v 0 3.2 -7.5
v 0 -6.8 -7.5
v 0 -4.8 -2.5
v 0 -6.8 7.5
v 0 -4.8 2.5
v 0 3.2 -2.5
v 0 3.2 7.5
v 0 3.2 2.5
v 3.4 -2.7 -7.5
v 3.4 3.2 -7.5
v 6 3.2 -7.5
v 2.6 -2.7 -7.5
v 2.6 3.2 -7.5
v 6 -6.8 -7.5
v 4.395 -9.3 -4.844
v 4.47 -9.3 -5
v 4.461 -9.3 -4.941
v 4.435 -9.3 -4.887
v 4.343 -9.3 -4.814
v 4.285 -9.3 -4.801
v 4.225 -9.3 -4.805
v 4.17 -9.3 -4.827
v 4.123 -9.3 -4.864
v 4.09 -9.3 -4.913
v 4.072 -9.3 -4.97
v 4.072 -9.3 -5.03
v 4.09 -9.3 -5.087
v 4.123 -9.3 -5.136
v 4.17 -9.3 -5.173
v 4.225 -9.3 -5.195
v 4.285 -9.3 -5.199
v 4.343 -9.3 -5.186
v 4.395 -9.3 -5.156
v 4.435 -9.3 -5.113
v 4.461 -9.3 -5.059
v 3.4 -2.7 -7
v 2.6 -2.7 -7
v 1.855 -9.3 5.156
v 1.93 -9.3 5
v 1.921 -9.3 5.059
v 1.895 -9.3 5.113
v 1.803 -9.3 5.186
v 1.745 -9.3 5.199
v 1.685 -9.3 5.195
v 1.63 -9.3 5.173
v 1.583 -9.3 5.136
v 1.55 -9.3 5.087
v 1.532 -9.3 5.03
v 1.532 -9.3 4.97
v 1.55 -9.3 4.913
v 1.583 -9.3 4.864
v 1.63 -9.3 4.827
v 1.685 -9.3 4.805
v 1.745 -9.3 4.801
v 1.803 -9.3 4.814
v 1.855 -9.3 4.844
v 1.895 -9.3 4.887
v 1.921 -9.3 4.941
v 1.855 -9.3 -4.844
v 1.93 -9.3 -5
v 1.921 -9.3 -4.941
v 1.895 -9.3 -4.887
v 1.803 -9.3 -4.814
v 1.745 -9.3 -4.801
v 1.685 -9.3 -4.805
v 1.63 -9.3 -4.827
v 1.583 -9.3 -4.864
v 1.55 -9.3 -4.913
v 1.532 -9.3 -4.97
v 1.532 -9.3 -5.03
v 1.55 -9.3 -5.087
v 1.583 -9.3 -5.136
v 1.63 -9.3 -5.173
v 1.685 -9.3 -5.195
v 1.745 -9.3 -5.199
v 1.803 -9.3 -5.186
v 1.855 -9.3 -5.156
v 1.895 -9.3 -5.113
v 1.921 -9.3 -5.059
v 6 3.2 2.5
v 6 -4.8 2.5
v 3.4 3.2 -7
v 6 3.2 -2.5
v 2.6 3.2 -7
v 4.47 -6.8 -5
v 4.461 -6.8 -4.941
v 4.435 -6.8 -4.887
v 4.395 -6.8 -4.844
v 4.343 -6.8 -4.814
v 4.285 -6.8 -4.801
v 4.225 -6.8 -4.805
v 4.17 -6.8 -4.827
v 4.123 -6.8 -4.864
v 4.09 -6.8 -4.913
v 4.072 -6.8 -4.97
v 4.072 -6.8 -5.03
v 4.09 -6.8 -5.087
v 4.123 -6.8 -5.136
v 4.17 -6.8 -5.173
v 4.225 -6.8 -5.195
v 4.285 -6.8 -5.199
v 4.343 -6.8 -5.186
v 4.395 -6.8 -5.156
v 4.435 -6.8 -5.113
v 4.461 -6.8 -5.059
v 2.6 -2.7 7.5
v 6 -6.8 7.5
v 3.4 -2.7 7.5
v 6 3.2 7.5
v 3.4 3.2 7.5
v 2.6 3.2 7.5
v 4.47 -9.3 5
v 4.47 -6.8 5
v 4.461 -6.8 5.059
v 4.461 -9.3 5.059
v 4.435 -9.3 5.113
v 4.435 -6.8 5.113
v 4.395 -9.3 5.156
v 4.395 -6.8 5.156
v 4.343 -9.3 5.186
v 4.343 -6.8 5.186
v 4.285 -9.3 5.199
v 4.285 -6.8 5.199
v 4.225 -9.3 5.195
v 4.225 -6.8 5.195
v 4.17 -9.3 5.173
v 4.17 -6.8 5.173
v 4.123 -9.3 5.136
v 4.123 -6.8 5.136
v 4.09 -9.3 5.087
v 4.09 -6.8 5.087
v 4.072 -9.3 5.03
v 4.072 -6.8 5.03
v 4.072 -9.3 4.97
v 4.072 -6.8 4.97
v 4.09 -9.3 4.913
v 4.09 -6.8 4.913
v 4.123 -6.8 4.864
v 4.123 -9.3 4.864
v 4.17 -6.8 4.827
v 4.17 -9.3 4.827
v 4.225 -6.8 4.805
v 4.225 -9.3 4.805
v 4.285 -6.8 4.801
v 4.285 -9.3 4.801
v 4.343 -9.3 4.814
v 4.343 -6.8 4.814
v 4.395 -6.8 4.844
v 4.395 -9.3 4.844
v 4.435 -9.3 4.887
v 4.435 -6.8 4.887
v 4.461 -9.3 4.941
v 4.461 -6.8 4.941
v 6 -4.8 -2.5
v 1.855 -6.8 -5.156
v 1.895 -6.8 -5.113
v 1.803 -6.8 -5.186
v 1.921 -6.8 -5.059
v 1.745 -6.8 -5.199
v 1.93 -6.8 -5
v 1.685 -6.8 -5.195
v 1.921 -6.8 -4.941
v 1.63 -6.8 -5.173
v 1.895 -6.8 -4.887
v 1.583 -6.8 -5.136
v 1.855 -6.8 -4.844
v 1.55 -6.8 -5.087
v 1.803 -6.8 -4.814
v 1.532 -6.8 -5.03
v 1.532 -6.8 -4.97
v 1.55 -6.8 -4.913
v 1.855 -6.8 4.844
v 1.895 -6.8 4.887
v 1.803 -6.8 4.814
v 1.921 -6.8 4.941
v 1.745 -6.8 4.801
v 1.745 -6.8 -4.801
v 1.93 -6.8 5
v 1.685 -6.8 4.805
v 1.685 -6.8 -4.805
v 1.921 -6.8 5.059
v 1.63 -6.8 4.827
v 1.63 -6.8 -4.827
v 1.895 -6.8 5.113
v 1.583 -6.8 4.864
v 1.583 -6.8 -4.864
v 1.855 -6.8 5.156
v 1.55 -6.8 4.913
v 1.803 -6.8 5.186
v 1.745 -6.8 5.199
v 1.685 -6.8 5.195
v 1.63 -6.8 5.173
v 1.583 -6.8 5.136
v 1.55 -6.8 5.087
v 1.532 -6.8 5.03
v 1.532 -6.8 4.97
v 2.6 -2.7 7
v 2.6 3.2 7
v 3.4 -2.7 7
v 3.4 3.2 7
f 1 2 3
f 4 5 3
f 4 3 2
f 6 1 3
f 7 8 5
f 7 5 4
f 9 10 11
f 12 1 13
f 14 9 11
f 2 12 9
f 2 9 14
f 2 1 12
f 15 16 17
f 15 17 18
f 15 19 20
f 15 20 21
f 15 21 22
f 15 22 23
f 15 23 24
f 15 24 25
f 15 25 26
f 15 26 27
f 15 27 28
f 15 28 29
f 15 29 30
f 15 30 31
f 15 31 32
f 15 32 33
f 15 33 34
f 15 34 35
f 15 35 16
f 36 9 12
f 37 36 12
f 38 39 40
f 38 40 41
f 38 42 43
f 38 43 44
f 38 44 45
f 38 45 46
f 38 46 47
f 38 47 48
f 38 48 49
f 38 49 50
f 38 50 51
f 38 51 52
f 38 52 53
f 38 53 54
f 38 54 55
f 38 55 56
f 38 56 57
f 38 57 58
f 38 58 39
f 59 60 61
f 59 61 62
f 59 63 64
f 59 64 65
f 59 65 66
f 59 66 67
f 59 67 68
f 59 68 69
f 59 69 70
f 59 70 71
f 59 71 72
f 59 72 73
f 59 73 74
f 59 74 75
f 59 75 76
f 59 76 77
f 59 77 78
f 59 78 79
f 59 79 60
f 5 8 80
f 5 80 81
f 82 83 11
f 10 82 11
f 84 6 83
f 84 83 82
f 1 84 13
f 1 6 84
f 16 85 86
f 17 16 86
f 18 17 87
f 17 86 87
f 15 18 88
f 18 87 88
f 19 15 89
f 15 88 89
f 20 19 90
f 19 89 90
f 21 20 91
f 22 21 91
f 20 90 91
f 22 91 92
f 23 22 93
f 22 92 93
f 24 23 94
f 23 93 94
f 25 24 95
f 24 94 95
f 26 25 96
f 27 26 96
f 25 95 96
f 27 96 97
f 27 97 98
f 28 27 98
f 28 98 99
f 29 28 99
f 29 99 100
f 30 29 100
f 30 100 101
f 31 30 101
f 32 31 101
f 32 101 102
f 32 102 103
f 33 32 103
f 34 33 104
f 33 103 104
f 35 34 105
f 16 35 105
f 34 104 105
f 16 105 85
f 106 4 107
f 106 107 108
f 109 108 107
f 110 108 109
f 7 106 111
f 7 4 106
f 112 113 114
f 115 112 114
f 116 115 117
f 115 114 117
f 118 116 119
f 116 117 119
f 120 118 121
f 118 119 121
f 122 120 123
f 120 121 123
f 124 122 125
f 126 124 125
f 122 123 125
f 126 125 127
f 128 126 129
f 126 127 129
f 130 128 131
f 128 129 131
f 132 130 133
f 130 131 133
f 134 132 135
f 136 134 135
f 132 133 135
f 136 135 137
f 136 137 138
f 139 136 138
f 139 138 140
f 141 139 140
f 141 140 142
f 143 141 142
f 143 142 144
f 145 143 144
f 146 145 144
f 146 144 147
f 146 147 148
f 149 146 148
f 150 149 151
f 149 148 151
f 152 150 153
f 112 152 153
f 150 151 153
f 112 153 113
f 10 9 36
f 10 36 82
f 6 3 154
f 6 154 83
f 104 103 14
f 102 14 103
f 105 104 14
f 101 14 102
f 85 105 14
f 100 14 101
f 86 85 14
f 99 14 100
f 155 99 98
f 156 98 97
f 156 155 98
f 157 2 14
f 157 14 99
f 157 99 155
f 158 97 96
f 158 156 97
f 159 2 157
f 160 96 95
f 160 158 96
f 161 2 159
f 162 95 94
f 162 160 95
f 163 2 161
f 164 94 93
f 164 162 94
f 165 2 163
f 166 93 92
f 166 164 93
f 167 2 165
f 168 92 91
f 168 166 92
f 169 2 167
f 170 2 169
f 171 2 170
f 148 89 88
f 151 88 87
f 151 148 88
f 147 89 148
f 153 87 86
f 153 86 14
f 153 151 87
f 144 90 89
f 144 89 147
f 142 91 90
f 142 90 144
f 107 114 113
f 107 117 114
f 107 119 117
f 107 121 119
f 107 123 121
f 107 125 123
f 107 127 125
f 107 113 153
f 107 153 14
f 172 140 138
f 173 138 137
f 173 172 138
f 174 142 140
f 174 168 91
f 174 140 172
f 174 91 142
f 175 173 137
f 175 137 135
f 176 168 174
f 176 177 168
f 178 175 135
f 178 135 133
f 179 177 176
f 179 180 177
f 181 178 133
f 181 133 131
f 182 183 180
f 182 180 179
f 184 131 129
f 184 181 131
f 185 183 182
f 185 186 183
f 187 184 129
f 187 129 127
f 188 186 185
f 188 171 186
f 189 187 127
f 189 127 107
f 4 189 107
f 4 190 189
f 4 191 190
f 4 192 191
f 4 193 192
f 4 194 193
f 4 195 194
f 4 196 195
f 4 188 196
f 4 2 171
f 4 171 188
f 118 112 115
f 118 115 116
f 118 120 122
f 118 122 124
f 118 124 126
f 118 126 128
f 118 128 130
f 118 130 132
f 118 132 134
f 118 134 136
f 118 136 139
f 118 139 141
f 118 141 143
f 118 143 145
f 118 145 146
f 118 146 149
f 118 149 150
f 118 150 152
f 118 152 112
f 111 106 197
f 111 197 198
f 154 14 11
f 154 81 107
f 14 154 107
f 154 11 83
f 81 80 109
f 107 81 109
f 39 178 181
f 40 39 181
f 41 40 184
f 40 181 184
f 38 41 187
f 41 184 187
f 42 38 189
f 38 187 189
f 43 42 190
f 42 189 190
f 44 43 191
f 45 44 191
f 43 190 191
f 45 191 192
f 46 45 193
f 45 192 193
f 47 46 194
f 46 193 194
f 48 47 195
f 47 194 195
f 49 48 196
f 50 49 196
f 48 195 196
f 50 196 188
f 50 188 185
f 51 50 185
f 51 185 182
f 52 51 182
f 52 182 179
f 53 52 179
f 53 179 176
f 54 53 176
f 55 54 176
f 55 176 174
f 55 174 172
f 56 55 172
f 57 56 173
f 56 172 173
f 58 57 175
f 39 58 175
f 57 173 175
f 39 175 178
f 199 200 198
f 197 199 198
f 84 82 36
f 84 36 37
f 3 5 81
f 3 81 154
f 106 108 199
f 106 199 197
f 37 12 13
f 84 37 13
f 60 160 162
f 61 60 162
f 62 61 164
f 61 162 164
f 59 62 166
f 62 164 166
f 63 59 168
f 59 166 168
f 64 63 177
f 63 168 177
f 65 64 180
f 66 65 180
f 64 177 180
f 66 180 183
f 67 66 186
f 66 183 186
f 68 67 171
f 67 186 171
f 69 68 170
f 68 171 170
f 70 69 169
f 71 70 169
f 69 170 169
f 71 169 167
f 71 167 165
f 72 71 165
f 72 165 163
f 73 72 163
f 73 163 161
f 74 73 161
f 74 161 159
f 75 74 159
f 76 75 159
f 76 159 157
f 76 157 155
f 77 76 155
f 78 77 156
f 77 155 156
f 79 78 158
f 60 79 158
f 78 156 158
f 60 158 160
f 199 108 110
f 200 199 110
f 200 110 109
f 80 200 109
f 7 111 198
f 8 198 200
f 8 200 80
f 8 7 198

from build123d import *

# Parameters (mm, degrees)
BOSS_EXTRUDE1_DEPTH = 6
SKETCH2_W           = 0.8
SKETCH2_H           = 5.9
CUT_EXTRUDE1_DEPTH  = 0.5
SKETCH3_R           = 0.2
BOSS_EXTRUDE2_DEPTH = 2.5


with BuildPart() as part:
    # Sketch1 → Boss-Extrude1 (new body)
    with BuildSketch(Plane(origin=(0, 0, 0), x_dir=(0, 0, -1), z_dir=(1, 0, 0))):
        Polygon((-7.5, -6.8), (-7.5, 3.2), (-2.5, 3.2), (-2.5, -4.8), (2.5, -4.8), (2.5, 3.2), (7.5, 3.2), (7.5, -6.8), align=None)
    extrude(amount=BOSS_EXTRUDE1_DEPTH)

    # Sketch2 → Cut-Extrude1 (cut)
    with BuildSketch(Plane(origin=(0, 0, -7.5), x_dir=(-1, 0, 0), z_dir=(0, 0, -1))):
        with Locations((-3, 0.25)):
            Rectangle(SKETCH2_W, SKETCH2_H)
    cut_extrude1 = extrude(amount=-CUT_EXTRUDE1_DEPTH, mode=Mode.SUBTRACT)

    # Mirror1: Cut-Extrude1 across plane
    add(cut_extrude1.mirror(Plane.XY), mode=Mode.SUBTRACT)

    # Sketch3 → Boss-Extrude2 (add)
    with BuildSketch(Plane.XZ.offset(6.8)):
        with Locations((1.73, -5)):
            Circle(SKETCH3_R)
        with Locations((4.27, -5)):
            Circle(SKETCH3_R)
        with Locations((4.27, 5)):
            Circle(SKETCH3_R)
        with Locations((1.73, 5)):
            Circle(SKETCH3_R)
    extrude(amount=BOSS_EXTRUDE2_DEPTH)


solid = part.part
